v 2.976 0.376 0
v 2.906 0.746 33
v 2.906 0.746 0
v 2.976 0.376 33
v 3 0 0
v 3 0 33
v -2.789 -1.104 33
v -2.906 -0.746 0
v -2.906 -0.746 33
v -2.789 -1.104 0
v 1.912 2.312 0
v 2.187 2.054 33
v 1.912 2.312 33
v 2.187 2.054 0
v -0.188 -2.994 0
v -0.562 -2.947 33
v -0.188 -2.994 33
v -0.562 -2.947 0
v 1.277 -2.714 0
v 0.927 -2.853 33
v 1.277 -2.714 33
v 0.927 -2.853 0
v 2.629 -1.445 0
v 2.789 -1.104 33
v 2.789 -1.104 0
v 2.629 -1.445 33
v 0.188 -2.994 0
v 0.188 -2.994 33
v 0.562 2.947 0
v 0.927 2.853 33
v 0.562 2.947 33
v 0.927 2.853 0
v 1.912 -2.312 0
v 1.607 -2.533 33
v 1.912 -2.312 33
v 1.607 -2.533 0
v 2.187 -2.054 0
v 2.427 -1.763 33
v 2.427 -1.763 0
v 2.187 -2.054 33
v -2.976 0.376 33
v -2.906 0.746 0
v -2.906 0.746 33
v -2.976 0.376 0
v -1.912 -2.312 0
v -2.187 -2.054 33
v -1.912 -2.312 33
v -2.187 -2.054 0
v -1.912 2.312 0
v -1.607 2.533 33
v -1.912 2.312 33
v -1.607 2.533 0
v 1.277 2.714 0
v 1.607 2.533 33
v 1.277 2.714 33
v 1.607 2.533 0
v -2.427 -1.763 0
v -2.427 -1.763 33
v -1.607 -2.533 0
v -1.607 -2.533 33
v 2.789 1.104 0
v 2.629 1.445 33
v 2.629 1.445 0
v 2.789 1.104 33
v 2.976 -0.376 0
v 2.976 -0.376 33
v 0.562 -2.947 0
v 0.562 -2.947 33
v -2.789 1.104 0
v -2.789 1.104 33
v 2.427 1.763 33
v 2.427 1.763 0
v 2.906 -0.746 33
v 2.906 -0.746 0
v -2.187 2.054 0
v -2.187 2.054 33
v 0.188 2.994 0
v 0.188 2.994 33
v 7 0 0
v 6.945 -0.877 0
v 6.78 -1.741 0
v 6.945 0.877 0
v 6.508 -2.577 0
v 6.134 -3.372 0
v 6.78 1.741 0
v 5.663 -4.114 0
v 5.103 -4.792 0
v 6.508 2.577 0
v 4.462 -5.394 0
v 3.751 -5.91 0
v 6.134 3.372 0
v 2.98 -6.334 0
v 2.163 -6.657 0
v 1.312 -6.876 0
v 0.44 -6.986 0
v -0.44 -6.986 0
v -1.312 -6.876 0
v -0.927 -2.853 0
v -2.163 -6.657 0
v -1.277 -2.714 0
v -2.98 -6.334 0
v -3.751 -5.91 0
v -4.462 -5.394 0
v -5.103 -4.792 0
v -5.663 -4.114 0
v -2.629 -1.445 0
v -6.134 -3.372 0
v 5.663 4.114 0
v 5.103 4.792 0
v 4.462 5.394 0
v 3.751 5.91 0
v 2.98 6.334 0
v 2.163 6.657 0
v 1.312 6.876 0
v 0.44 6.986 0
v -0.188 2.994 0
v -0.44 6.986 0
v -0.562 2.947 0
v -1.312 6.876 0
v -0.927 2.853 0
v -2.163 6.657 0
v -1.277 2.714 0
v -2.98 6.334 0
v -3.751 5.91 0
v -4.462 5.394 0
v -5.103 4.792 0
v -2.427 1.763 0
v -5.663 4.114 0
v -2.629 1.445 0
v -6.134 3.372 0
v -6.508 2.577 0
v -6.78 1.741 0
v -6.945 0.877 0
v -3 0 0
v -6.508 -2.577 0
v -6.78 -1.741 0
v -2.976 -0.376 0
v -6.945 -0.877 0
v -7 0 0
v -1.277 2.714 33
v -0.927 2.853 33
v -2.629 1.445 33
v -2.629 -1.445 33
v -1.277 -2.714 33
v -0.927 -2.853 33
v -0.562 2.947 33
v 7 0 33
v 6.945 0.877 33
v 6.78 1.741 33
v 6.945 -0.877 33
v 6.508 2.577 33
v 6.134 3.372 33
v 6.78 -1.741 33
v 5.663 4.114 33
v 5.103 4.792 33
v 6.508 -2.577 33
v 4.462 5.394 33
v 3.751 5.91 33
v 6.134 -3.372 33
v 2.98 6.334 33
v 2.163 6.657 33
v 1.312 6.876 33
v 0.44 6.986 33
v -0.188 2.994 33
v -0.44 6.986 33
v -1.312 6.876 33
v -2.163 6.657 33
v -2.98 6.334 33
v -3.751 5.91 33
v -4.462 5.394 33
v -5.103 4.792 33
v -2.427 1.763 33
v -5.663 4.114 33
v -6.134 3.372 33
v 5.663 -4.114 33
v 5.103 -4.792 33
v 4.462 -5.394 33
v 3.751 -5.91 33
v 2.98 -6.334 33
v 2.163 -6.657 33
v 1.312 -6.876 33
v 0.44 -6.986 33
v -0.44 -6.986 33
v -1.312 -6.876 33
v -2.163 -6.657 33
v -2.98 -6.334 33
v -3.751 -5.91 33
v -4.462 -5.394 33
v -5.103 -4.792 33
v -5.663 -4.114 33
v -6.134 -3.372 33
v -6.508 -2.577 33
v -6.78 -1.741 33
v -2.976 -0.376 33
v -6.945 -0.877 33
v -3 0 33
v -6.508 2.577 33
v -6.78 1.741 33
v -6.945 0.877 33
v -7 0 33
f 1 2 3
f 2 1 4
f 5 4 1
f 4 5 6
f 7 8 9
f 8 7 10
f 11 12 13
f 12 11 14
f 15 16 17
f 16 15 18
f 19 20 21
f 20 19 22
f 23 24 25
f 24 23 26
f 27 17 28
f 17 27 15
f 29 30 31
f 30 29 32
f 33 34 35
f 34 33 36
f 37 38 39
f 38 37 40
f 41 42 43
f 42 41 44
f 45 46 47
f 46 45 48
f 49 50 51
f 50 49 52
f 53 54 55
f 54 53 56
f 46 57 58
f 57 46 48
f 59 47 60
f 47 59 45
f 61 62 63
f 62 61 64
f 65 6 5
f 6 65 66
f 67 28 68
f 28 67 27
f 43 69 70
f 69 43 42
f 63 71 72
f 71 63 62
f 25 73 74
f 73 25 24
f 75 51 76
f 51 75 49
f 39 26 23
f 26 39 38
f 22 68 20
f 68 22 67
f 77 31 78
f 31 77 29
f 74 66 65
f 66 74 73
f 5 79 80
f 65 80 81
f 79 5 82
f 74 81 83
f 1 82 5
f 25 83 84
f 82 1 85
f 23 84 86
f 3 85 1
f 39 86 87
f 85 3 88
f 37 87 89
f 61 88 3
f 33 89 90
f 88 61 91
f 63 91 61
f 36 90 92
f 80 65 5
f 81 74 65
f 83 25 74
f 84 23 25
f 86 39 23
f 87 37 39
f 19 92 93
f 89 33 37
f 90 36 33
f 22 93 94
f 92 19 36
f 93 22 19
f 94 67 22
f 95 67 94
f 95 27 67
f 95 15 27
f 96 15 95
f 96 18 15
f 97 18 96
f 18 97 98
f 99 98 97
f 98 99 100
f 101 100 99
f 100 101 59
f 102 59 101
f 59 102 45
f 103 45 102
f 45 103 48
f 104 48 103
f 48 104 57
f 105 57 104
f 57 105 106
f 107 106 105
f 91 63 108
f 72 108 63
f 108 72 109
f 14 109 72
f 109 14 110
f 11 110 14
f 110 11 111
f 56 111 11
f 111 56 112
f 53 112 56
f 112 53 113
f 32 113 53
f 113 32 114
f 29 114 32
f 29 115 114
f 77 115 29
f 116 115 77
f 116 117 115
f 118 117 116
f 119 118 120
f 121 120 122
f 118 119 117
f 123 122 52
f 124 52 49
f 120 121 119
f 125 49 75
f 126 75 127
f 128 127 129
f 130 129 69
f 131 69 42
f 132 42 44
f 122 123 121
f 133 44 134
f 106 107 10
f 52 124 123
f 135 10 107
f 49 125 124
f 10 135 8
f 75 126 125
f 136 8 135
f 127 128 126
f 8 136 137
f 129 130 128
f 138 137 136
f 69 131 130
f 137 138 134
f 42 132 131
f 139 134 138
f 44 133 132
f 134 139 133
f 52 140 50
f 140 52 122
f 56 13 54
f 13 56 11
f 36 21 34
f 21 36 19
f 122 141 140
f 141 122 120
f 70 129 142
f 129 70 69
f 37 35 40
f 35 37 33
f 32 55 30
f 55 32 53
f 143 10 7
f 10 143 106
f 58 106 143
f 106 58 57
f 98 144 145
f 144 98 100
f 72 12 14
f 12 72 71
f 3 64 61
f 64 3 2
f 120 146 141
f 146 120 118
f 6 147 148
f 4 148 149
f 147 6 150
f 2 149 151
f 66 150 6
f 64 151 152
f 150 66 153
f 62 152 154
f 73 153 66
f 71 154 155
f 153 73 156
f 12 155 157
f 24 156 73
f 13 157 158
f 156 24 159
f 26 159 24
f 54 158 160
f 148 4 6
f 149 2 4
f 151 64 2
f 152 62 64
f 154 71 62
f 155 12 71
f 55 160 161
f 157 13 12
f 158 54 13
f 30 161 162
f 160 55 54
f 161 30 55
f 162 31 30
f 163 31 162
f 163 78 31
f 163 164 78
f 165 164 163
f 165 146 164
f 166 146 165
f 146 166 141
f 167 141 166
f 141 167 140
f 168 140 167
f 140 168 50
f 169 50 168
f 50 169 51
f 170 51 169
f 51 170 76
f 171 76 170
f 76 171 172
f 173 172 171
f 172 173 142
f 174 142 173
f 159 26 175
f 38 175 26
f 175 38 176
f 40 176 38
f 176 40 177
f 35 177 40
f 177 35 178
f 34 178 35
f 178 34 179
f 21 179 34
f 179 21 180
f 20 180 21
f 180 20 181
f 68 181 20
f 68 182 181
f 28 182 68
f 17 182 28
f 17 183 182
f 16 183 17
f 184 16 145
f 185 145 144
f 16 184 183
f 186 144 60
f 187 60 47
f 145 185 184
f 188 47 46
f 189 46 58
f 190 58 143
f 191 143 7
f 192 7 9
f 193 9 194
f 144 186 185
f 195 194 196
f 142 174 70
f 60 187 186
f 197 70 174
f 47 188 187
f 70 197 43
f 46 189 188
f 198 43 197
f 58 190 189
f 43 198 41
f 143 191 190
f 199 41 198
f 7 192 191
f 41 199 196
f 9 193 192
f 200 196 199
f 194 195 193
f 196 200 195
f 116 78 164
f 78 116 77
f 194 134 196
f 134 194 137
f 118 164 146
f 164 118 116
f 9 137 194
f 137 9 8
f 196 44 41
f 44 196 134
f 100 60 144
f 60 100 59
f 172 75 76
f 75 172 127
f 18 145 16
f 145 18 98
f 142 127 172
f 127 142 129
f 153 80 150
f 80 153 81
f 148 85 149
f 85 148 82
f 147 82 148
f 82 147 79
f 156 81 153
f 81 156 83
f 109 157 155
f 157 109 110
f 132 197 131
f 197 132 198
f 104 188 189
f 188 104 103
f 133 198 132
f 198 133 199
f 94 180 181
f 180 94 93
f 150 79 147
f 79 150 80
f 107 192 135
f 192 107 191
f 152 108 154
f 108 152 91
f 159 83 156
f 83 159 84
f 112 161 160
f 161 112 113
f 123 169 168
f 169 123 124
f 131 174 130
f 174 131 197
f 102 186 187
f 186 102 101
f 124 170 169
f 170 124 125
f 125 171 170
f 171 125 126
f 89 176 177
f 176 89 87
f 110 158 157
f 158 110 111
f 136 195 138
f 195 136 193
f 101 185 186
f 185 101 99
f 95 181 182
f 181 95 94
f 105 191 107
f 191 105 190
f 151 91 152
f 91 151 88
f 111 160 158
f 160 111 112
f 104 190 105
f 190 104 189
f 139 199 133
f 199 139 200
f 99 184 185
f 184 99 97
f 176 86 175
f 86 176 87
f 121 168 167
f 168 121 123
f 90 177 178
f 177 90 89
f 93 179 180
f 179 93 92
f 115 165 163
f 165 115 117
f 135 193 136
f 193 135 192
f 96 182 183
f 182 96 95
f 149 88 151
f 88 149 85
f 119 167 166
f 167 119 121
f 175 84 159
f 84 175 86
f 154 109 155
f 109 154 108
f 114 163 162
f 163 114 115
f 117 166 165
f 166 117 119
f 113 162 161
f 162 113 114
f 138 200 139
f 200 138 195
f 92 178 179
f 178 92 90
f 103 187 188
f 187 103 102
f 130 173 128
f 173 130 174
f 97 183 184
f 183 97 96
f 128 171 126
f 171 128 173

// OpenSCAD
$fn = 50;


difference() {
	union() {
		cylinder(h = 33, r = 7.0000000000);
	}
	union() {
		cylinder(h = 33, r = 3.0000000000);
		cylinder(h = 33, r = 3.0000000000);
		cylinder(h = 33, r = 1.5000000000);
		cylinder(h = 33, r = 1.5000000000);
		cylinder(h = 33, r = 1.5000000000);
		cylinder(h = 33, r = 1.5000000000);
		cylinder(h = 33, r = 1.5000000000);
		cylinder(h = 33, r = 1.5000000000);
	}
}
